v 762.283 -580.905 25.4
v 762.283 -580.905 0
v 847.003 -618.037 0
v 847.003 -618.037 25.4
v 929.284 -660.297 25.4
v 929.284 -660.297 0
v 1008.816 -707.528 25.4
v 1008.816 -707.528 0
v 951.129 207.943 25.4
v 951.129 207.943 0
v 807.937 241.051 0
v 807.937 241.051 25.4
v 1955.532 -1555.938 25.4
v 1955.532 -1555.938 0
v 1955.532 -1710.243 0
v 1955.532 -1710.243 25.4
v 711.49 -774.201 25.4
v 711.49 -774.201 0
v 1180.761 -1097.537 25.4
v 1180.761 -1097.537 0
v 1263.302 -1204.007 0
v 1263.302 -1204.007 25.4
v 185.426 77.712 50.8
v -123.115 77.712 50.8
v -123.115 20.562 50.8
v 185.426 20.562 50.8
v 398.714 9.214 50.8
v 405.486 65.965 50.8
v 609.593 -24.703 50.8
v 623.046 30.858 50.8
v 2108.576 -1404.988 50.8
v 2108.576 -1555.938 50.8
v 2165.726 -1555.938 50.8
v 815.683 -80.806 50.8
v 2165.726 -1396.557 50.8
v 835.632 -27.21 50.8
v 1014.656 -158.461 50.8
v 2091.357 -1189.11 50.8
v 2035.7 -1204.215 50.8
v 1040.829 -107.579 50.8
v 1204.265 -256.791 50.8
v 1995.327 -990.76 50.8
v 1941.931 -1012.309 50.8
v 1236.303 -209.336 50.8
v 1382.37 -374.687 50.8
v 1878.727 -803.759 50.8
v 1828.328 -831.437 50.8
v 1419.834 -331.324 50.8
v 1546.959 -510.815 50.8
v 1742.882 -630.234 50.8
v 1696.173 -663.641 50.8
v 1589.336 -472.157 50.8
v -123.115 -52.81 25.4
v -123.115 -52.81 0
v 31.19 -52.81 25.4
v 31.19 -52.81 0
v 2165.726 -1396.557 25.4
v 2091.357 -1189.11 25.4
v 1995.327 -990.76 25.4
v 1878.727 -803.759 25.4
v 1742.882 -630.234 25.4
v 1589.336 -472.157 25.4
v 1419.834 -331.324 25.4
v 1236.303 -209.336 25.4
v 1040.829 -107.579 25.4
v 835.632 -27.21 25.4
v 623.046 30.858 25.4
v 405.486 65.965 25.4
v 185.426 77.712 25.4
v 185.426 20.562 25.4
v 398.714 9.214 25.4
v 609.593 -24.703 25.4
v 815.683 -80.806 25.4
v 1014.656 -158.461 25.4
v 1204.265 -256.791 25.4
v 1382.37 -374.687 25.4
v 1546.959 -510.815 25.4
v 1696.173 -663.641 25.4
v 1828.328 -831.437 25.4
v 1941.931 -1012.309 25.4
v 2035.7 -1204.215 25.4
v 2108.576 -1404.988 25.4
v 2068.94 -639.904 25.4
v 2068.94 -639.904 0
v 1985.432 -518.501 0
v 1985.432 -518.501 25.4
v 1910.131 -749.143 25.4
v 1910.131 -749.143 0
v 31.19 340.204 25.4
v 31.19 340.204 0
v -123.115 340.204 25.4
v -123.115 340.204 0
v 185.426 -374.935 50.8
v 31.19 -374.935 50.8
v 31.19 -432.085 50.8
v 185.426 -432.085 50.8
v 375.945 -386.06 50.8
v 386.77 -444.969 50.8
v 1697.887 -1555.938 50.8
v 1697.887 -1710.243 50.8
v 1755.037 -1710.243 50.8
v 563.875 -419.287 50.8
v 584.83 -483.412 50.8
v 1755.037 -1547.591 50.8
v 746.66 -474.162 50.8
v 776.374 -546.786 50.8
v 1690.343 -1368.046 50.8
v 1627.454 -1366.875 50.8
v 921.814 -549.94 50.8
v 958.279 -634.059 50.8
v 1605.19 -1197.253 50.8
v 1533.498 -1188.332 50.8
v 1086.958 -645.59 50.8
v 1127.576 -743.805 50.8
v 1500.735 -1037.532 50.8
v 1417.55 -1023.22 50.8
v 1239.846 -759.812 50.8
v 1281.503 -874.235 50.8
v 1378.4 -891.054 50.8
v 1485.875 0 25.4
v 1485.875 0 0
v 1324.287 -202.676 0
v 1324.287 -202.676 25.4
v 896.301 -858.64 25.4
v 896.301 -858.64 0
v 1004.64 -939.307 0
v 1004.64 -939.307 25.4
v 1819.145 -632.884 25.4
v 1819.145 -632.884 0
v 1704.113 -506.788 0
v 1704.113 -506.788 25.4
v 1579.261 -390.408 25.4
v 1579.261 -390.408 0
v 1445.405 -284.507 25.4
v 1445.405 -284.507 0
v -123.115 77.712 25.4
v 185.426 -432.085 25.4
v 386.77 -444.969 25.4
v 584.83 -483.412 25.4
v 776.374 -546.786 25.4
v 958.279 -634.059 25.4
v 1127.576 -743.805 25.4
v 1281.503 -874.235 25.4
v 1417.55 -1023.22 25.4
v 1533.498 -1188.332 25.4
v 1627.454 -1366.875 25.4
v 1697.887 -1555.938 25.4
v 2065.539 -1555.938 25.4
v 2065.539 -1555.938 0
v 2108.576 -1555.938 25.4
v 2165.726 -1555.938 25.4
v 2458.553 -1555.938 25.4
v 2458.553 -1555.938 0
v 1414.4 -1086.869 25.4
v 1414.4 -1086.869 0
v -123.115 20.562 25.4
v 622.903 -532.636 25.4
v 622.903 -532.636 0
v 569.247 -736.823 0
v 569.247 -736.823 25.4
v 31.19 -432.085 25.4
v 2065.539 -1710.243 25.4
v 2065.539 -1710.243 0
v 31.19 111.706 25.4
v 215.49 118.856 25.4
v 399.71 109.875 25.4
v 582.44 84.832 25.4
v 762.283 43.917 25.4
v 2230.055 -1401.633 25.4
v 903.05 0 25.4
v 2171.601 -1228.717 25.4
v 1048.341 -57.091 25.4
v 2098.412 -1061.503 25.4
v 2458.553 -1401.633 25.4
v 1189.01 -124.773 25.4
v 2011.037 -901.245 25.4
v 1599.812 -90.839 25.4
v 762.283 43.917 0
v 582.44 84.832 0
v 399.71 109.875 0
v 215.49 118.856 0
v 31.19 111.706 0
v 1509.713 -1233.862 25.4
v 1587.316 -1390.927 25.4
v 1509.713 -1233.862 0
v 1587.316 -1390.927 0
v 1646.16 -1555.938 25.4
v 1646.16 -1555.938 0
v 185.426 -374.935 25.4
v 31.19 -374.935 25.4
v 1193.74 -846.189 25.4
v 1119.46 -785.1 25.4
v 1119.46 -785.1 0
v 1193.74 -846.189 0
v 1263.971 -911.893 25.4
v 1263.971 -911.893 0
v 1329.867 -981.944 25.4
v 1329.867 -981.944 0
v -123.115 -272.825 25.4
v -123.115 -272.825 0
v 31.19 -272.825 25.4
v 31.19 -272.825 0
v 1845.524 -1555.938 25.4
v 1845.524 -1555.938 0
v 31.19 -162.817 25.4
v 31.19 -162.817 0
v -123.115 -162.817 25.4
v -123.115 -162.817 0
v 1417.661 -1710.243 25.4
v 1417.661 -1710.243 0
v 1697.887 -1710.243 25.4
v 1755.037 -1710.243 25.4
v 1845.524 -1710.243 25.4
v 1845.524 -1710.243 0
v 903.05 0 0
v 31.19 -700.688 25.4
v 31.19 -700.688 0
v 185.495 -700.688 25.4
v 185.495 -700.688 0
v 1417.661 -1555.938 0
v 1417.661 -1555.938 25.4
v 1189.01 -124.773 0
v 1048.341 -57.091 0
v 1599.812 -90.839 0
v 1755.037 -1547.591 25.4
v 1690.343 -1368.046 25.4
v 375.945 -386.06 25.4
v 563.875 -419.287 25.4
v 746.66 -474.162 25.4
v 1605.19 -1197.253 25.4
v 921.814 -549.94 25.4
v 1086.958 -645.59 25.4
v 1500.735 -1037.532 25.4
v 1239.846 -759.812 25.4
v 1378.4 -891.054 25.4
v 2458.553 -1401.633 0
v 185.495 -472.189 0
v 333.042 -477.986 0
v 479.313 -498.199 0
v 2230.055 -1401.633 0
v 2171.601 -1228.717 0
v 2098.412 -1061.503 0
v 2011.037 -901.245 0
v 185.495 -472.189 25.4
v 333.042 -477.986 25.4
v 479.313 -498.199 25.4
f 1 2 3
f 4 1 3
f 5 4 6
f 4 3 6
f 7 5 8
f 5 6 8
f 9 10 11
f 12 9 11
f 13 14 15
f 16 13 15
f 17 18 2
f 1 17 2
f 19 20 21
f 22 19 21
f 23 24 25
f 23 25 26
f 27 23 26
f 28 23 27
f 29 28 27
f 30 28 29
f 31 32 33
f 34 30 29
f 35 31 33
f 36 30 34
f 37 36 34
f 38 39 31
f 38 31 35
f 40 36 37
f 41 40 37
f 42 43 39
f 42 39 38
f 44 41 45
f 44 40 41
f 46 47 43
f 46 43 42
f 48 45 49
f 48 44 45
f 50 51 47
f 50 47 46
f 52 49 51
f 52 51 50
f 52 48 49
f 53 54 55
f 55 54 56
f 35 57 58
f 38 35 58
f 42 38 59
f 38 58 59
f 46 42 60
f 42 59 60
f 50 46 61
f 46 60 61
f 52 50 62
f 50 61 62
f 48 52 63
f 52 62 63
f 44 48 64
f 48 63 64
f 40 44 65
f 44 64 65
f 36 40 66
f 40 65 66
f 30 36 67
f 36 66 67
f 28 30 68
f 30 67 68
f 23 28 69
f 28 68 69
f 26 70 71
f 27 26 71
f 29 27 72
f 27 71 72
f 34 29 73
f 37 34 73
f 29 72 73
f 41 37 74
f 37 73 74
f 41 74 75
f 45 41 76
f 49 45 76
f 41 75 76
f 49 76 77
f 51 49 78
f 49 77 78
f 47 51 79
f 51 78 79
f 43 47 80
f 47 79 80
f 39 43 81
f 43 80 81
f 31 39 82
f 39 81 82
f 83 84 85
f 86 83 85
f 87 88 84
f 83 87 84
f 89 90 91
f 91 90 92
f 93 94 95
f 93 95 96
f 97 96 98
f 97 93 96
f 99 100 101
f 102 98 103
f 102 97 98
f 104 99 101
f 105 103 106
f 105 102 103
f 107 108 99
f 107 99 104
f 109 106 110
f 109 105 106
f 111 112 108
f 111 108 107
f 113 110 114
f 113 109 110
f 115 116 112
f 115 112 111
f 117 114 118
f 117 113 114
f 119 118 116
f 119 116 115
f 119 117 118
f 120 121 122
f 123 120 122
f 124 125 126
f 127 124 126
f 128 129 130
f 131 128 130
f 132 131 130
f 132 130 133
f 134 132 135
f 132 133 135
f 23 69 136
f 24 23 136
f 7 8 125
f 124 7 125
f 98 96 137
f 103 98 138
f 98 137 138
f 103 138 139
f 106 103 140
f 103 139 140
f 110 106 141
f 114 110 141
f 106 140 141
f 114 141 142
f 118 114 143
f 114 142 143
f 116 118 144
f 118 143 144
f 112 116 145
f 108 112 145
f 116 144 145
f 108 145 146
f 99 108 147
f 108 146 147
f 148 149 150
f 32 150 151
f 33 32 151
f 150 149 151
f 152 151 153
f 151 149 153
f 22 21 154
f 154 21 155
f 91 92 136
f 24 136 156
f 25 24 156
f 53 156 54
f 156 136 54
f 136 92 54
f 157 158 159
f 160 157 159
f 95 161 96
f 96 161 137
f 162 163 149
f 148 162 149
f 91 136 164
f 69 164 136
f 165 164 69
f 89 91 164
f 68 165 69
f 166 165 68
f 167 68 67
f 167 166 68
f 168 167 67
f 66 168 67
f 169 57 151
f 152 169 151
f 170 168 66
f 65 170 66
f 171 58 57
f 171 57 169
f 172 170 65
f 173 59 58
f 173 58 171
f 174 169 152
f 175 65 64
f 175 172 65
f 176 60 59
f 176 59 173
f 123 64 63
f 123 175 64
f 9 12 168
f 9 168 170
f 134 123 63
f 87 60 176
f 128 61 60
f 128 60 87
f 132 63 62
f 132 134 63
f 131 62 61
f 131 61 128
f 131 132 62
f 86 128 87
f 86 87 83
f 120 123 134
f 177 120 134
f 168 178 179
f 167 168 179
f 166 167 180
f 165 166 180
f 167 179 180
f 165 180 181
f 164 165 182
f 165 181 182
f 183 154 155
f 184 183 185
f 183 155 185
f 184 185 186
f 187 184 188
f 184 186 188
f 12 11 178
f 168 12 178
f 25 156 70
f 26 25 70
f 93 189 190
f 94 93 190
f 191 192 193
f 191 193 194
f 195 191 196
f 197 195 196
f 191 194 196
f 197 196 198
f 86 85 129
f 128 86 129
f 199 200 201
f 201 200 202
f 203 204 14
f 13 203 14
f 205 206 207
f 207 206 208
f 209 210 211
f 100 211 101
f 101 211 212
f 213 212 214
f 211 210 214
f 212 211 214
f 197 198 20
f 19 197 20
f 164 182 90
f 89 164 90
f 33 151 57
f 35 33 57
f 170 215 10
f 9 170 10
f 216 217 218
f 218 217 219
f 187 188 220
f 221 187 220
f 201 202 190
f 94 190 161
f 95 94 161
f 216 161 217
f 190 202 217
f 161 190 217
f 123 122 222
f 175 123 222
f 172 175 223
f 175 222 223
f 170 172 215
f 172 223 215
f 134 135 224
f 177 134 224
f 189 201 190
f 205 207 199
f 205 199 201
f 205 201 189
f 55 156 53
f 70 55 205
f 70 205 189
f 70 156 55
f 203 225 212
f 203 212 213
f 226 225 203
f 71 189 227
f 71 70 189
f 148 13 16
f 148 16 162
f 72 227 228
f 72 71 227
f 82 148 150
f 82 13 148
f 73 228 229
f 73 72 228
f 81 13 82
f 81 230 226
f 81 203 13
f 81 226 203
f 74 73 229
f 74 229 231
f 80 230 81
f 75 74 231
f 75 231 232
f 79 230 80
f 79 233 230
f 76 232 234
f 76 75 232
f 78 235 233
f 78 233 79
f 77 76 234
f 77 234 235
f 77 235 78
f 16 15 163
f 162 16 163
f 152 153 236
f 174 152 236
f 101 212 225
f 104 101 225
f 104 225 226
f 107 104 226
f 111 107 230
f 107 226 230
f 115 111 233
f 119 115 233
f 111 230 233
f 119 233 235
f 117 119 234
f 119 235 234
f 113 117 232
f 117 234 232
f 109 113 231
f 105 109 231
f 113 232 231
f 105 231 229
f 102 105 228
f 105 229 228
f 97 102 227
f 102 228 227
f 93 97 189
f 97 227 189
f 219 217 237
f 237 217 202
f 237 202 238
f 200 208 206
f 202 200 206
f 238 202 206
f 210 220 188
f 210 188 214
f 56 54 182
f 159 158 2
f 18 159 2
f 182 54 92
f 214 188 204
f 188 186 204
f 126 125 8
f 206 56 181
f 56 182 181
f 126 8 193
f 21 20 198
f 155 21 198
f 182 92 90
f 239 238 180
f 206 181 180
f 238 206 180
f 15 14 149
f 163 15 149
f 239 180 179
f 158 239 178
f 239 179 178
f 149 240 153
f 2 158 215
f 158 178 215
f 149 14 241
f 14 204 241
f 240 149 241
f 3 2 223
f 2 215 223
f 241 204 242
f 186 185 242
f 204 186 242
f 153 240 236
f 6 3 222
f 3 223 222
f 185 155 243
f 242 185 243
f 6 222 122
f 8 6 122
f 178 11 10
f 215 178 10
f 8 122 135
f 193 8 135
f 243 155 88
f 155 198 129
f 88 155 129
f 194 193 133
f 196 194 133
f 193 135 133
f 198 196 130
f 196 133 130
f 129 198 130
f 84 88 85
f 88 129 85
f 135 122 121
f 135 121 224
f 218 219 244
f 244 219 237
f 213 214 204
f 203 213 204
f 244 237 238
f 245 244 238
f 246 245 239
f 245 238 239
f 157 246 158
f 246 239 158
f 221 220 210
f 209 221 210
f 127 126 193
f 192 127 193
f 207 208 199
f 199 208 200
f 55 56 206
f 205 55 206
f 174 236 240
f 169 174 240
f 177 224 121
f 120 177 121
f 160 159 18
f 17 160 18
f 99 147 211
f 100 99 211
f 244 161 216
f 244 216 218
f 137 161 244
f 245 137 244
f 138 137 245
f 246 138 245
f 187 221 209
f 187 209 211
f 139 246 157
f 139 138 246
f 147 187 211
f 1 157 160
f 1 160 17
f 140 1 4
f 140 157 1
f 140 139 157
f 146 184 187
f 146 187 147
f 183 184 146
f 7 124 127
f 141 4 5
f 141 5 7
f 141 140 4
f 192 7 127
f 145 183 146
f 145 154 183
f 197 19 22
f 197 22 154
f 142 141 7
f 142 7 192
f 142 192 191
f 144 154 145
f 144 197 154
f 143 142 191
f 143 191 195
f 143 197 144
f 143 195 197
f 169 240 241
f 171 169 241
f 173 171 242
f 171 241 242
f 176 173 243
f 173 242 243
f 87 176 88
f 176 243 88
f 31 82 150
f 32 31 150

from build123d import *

# Parameters (mm, degrees)
F1_DEPTH = 25.4
F3_DEPTH = 25.4


with BuildPart() as f1:
    # F0 (on Top) → F1 (new body)
    with BuildSketch(Plane.XY):
        with BuildLine():
            Line((31.189967, 340.204117), (-123.115033, 340.204117))
            Line((-123.115033, 340.204117), (-123.115033, -52.810083))
            Line((-123.115033, -52.810083), (31.189967, -52.810083))
            Line((31.189967, -52.810083), (31.189967, -162.817483))
            Line((31.189967, -162.817483), (-123.115033, -162.817483))
            Line((-123.115033, -162.817483), (-123.115033, -272.824883))
            Line((-123.115033, -272.824883), (31.189967, -272.824883))
            Line((31.189967, -272.824883), (31.189967, -700.687883))
            Line((31.189967, -700.687883), (185.494967, -700.687883))
            Line((185.494967, -700.687883), (185.494967, -472.189483))
            ThreePointArc((185.494967, -472.189483), (406.425601, -486.299438), (622.902739, -532.636077))
            ThreePointArc((622.902739, -532.636077), (693.184114, -555.0638), (762.283228, -580.90537))
            ThreePointArc((762.283228, -580.90537), (888.467852, -638.535397), (1008.816242, -707.528472))
            ThreePointArc((1008.816242, -707.528472), (1065.008132, -745.073189), (1119.459623, -785.100298))
            ThreePointArc((1119.459623, -785.100298), (1229.380136, -878.480043), (1329.866812, -981.94368))
            ThreePointArc((1329.866812, -981.94368), (1373.307096, -1033.460725), (1414.400011, -1086.86893))
            ThreePointArc((1414.400011, -1086.86893), (1550.799617, -1311.26525), (1646.159828, -1555.938482))
            Line((1646.159828, -1555.938482), (1417.661428, -1555.938482))
            Line((1417.661428, -1555.938482), (1417.661428, -1710.243482))
            Line((1417.661428, -1710.243482), (1845.524428, -1710.243482))
            Line((1845.524428, -1710.243482), (1845.524428, -1555.938482))
            Line((1845.524428, -1555.938482), (1955.531828, -1555.938482))
            Line((1955.531828, -1555.938482), (1955.531828, -1710.243482))
            Line((1955.531828, -1710.243482), (2065.539228, -1710.243482))
            Line((2065.539228, -1710.243482), (2065.539228, -1555.938482))
            Line((2065.539228, -1555.938482), (2458.553428, -1555.938482))
            Line((2458.553428, -1555.938482), (2458.553428, -1401.633482))
            Line((2458.553428, -1401.633482), (2230.055028, -1401.633482))
            ThreePointArc((2230.055028, -1401.633482), (2098.411782, -1061.503235), (1910.130691, -749.14325))
            ThreePointArc((1910.130691, -749.14325), (1865.655335, -690.217277), (1819.144574, -632.884244))
            ThreePointArc((1819.144574, -632.884244), (1642.865002, -447.334595), (1445.405297, -284.507002))
            ThreePointArc((1445.405297, -284.507002), (1385.55525, -242.541612), (1324.286706, -202.675744))
            ThreePointArc((1324.286706, -202.675744), (1119.301825, -89.629511), (903.050114, 0))
            ThreePointArc((903.050114, 0), (833.05066, 23.189152), (762.283228, 43.916693))
            ThreePointArc((762.283228, 43.916693), (399.709676, 109.875363), (31.189967, 111.705717))
            Line((31.189967, 111.705717), (31.189967, 340.204117))
        make_face()
        with BuildLine():
            Line((807.937359, 241.05063), (762.283228, 43.916693))
            ThreePointArc((762.283228, 43.916693), (833.05066, 23.189152), (903.050114, 0))
            Line((903.050114, 0), (951.129198, 207.942814))
            Line((951.129198, 207.942814), (807.937359, 241.05063))
        make_face()
        with BuildLine():
            Line((1485.874518, 0), (1324.286706, -202.675744))
            ThreePointArc((1324.286706, -202.675744), (1385.55525, -242.541612), (1445.405297, -284.507002))
            Line((1445.405297, -284.507002), (1599.811573, -90.838889))
            Line((1599.811573, -90.838889), (1485.874518, 0))
        make_face()
        with BuildLine():
            Line((1985.43191, -518.501341), (1819.144574, -632.884244))
            ThreePointArc((1819.144574, -632.884244), (1865.655335, -690.217277), (1910.130691, -749.14325))
            Line((1910.130691, -749.14325), (2068.940302, -639.903997))
            Line((2068.940302, -639.903997), (1985.43191, -518.501341))
        make_face()
        with BuildLine():
            ThreePointArc((762.283228, -580.90537), (693.184114, -555.0638), (622.902739, -532.636077))
            Line((622.902739, -532.636077), (569.247404, -736.823327))
            Line((569.247404, -736.823327), (711.489907, -774.201122))
            Line((711.489907, -774.201122), (762.283228, -580.90537))
        make_face()
        with BuildLine():
            ThreePointArc((1119.459623, -785.100298), (1065.008132, -745.073189), (1008.816242, -707.528472))
            Line((1008.816242, -707.528472), (896.301459, -858.639513))
            Line((896.301459, -858.639513), (1004.640102, -939.306676))
            Line((1004.640102, -939.306676), (1119.459623, -785.100298))
        make_face()
        with BuildLine():
            ThreePointArc((1414.400011, -1086.86893), (1373.307096, -1033.460725), (1329.866812, -981.94368))
            Line((1329.866812, -981.94368), (1180.761456, -1097.536802))
            Line((1180.761456, -1097.536802), (1263.301866, -1204.006952))
            Line((1263.301866, -1204.006952), (1414.400011, -1086.86893))
        make_face()
    extrude(amount=F1_DEPTH)

    # F2 (on face) → F3 (join)
    with BuildSketch(Plane.XY.offset(25.4)):
        with BuildLine():
            Line((31.189967, -374.934591), (31.189967, -432.08459))
            Line((31.189967, -432.08459), (185.42558, -432.08459))
            ThreePointArc((185.42558, -432.08459), (1127.575593, -743.804748), (1697.886825, -1555.938482))
            Line((1697.886825, -1555.938482), (1697.886825, -1710.243482))
            Line((1697.886825, -1710.243482), (1755.036824, -1710.243482))
            Line((1755.036824, -1710.243482), (1755.036824, -1547.590702))
            ThreePointArc((1755.036824, -1547.590702), (1165.068603, -700.470951), (185.42558, -374.934591))
            Line((185.42558, -374.934591), (31.189967, -374.934591))
        make_face()
        with BuildLine():
            Line((185.42558, 77.712215), (-123.115033, 77.712215))
            Line((-123.115033, 77.712215), (-123.115033, 20.562185))
            Line((-123.115033, 20.562185), (185.42558, 20.562185))
            ThreePointArc((185.42558, 20.562185), (1382.369796, -374.686549), (2108.576155, -1404.988128))
            Line((2108.576155, -1404.988128), (2108.576155, -1555.938482))
            Line((2108.576155, -1555.938482), (2165.726185, -1555.938482))
            Line((2165.726185, -1555.938482), (2165.726185, -1396.556735))
            ThreePointArc((2165.726185, -1396.556735), (1419.834287, -331.324007), (185.42558, 77.712215))
        make_face()
    extrude(amount=F3_DEPTH)


solid = f1.part
